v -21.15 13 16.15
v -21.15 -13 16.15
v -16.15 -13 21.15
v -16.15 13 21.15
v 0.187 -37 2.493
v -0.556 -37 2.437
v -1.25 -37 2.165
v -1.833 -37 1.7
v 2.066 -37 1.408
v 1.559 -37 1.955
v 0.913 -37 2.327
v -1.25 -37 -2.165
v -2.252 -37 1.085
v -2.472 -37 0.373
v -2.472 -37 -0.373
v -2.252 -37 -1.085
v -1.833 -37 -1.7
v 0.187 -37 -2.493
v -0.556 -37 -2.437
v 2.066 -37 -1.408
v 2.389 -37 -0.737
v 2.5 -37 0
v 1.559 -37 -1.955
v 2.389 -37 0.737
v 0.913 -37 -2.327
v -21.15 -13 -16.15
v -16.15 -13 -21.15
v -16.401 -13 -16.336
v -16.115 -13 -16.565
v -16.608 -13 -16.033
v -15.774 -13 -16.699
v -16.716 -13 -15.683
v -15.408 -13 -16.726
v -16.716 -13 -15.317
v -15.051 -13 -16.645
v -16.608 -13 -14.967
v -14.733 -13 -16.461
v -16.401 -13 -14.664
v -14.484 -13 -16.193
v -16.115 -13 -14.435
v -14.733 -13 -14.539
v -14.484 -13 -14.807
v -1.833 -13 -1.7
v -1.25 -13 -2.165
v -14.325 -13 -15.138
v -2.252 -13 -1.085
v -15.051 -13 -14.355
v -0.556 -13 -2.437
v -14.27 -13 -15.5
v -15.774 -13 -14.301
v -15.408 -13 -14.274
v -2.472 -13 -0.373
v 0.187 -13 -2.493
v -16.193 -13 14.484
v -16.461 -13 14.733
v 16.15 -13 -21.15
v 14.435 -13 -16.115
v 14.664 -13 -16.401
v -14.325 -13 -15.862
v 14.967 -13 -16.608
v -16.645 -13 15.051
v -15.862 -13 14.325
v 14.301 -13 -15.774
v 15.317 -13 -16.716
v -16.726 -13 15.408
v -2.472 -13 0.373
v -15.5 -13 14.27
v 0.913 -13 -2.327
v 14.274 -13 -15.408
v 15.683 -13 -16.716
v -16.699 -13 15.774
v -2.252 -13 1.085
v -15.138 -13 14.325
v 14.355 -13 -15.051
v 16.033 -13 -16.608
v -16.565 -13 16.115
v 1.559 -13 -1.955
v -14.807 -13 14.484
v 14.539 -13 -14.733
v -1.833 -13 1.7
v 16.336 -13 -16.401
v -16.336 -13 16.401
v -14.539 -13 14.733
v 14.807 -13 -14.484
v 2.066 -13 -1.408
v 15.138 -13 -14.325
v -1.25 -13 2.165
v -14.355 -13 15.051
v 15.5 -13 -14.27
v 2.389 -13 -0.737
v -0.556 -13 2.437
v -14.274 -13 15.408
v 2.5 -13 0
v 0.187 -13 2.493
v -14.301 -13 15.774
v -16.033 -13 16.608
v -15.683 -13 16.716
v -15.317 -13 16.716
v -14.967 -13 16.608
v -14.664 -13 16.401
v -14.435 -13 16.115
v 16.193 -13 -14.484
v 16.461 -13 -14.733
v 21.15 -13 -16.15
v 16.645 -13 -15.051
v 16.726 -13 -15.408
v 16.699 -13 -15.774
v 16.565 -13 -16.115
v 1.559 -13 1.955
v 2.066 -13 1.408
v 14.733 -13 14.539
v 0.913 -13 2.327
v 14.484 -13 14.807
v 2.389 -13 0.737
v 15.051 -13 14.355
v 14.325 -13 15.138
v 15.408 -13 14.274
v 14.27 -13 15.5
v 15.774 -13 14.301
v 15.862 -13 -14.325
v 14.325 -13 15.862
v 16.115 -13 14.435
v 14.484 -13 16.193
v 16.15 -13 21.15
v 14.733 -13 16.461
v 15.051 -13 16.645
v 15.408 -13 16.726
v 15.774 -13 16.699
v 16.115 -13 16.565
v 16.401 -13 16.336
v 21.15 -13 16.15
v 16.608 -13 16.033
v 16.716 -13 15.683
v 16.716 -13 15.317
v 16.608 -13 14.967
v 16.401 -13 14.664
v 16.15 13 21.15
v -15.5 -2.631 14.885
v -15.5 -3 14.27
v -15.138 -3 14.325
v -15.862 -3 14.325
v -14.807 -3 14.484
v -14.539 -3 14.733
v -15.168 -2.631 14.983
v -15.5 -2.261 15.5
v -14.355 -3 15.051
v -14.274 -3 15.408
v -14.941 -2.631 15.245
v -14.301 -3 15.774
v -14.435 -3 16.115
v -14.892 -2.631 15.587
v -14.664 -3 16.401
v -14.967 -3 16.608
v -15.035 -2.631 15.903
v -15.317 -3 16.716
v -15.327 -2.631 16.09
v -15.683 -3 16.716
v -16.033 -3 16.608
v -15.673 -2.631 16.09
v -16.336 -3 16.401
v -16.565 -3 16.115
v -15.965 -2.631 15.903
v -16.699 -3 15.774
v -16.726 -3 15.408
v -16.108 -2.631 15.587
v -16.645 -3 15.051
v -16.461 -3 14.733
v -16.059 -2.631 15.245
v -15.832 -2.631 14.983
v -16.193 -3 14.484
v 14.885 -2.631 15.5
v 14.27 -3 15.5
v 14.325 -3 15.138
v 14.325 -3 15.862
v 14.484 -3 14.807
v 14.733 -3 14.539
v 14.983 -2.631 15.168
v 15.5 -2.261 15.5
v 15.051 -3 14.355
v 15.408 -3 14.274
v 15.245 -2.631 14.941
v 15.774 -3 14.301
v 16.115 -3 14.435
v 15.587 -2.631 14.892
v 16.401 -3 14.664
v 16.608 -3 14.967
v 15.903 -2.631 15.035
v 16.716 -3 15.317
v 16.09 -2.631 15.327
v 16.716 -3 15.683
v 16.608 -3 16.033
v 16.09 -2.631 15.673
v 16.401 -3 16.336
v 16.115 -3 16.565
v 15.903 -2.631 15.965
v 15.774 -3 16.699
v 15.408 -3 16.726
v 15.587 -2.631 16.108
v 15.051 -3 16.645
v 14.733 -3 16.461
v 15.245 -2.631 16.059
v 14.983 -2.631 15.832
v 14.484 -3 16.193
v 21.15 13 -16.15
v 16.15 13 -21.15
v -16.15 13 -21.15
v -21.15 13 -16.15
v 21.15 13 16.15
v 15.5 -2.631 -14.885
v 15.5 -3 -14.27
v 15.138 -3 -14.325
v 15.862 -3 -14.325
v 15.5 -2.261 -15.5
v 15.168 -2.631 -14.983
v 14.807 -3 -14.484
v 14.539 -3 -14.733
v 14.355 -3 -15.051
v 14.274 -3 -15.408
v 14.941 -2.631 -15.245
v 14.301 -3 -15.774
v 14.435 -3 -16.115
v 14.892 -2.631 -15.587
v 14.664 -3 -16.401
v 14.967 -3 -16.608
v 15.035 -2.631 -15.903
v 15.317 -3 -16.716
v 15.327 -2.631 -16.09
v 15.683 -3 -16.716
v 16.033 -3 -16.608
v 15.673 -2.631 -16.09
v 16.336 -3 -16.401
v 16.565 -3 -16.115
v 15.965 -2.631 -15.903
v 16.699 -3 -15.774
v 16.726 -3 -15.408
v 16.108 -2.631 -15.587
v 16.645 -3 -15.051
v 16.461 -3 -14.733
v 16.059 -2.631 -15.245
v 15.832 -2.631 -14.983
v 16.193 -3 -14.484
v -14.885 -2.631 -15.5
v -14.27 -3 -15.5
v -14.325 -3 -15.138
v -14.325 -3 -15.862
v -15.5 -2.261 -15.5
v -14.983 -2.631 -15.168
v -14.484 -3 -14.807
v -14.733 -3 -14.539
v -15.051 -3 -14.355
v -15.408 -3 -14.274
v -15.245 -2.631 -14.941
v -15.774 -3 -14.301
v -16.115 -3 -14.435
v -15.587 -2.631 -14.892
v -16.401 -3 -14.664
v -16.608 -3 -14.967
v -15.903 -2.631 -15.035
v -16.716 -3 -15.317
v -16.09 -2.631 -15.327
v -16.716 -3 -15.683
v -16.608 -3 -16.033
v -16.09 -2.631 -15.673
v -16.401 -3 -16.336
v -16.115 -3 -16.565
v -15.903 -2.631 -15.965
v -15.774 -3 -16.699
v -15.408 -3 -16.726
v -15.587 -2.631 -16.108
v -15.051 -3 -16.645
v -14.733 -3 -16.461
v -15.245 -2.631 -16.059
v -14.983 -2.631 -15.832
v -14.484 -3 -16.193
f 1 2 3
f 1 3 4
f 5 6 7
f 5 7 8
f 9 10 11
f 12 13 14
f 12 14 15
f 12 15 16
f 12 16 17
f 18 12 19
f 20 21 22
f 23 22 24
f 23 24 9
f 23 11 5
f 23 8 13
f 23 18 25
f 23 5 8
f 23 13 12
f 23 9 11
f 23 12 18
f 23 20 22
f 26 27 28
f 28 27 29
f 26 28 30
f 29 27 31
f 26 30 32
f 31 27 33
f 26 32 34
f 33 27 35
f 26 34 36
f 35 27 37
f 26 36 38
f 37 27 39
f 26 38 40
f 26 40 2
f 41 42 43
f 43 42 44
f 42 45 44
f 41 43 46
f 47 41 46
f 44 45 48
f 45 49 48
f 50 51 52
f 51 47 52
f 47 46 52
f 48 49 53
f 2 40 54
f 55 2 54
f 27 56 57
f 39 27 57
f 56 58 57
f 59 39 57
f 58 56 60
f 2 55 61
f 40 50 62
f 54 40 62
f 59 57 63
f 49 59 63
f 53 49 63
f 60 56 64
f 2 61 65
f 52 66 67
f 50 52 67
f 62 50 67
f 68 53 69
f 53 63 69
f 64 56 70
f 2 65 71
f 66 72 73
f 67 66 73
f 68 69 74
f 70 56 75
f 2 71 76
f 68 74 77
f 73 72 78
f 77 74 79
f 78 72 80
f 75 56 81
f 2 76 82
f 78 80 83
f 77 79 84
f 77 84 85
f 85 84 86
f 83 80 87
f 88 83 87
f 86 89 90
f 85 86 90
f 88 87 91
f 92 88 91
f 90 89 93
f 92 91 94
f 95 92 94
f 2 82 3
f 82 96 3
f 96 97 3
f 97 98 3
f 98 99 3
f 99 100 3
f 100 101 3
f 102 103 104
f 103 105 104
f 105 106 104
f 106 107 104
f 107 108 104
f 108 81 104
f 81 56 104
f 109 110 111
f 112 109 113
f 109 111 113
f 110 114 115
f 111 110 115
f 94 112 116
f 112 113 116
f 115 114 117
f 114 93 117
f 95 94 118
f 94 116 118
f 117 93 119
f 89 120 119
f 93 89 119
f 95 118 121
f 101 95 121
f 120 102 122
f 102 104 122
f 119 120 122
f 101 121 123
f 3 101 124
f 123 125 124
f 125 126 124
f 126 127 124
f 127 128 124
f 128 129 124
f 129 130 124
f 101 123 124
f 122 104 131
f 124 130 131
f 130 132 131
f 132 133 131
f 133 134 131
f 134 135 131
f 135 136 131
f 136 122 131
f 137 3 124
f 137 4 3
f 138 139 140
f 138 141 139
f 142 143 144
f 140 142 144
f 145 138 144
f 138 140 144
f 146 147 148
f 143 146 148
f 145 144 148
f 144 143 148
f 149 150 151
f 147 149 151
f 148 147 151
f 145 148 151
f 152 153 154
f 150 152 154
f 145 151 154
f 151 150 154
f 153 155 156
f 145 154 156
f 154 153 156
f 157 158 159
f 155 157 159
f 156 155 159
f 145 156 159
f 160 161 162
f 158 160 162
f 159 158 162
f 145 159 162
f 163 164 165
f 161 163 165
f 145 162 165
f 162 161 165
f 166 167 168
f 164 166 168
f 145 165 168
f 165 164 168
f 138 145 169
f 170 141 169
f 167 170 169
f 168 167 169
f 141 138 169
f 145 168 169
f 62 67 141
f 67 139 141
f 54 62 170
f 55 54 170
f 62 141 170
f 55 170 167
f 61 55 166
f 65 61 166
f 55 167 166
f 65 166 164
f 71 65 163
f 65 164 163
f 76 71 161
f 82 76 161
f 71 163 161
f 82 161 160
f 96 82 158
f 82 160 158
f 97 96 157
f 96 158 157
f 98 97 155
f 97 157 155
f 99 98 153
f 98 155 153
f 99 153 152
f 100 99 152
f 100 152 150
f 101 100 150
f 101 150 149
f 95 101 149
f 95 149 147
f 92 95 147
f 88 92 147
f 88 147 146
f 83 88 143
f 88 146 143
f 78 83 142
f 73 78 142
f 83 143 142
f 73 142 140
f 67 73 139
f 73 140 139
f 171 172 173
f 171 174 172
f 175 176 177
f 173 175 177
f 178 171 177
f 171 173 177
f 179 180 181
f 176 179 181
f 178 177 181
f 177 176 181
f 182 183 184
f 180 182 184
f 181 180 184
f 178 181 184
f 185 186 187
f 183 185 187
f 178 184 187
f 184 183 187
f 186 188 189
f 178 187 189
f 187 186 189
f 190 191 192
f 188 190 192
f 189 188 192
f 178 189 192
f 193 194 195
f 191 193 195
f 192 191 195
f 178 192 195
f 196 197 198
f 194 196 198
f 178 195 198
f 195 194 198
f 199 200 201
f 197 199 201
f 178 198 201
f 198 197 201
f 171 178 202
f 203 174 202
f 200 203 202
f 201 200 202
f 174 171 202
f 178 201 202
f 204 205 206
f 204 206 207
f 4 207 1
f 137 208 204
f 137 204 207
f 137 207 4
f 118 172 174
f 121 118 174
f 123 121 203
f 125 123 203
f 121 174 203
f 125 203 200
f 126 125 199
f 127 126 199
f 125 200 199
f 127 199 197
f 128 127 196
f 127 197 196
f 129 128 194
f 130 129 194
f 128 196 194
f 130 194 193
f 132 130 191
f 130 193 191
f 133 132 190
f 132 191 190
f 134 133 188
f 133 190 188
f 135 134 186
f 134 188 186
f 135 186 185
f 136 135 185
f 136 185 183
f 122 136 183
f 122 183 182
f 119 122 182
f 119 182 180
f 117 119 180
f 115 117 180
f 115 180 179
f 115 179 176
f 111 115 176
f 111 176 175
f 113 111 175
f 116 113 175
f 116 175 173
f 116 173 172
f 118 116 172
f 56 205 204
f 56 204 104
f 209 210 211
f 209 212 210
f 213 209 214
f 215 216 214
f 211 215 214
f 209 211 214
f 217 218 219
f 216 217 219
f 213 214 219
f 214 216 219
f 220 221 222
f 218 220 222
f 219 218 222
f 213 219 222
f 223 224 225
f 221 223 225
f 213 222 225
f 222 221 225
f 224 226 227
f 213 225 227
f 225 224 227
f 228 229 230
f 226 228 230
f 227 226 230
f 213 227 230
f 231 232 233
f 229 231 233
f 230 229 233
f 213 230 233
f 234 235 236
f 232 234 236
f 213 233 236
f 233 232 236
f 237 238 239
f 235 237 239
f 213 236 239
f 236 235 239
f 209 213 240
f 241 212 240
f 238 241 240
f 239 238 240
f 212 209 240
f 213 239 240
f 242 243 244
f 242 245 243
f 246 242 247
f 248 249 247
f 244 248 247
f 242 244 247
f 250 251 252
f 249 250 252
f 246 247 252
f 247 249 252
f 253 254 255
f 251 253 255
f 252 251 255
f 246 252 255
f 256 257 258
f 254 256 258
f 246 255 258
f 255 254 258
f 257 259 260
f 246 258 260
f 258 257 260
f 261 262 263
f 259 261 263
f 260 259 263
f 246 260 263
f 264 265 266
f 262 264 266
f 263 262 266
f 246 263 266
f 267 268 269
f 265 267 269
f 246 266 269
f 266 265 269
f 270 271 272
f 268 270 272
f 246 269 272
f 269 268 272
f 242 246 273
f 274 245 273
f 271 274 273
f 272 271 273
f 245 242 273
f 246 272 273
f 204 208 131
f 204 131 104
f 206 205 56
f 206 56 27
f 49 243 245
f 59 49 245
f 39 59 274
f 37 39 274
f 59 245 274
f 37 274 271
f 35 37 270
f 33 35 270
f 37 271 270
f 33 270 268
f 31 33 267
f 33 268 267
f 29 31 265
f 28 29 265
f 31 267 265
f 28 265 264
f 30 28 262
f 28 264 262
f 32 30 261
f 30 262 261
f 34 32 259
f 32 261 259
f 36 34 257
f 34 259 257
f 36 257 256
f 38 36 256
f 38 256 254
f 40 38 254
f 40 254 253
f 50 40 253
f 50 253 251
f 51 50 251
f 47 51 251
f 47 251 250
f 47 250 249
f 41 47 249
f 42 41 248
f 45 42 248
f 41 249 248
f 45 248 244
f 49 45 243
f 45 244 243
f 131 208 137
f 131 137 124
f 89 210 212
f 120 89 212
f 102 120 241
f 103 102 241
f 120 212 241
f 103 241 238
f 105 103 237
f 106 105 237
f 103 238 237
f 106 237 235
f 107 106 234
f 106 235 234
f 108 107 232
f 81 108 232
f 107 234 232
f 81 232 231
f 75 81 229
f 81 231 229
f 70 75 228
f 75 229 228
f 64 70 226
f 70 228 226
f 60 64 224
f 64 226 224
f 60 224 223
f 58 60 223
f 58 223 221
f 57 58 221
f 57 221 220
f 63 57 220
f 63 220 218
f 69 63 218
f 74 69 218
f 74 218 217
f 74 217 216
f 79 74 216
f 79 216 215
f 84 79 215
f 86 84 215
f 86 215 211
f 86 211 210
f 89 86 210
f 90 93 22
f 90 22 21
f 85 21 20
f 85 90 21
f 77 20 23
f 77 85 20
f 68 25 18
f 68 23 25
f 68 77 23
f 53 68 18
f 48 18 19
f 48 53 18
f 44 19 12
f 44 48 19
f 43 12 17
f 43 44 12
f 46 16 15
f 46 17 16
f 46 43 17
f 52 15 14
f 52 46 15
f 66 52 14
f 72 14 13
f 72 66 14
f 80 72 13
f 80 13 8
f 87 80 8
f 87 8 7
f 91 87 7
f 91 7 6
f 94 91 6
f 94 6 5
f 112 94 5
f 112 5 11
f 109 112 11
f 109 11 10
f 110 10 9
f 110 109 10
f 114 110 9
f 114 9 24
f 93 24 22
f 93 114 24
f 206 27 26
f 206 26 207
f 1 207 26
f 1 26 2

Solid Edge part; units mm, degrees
sketch "Sketch1" plane through (0, 0, 0) normal (0, -1, 0) x (1, 0, 0)
  line L0 (-21.15, 21.15) -> (21.15, 21.15)
  line L1 (21.15, 21.15) -> (21.15, -21.15)
  line L2 (21.15, -21.15) -> (-21.15, -21.15)
  line L3 (-21.15, -21.15) -> (-21.15, 21.15)
  dimension "D1" = 42.3
  dimension "D2" = 42.3
extrude "Protrusion1" add sketch "Sketch1" along normal mid plane 26
sketch "Sketch2" plane through (0, -13, 0) normal (0, -1, 0) x (1, 0, 0)
  circle A0 centre (0, 0) radius 2.5
  dimension "D1" = 5
extrude "Extrusionsausprägung_2" add sketch "Sketch2" along normal blind 24
hole "Bohrung_1" at (-15.5, -13, 15.5) direction (0, 1, 0) diameter 2.459 depth 10 tip angle 118 thread major 3 thread length 8
pattern_circular "Pattern1" count 4 over 360 about axis through (0, -13, 0) along (0, 1, 0) of "Bohrung_1"
chamfer "Fase_1" distance 5 angle 45 4 edges at (21.15, 0, 21.15) (-21.15, 0, 21.15) (21.15, 0, -21.15) (-21.15, 0, -21.15)
